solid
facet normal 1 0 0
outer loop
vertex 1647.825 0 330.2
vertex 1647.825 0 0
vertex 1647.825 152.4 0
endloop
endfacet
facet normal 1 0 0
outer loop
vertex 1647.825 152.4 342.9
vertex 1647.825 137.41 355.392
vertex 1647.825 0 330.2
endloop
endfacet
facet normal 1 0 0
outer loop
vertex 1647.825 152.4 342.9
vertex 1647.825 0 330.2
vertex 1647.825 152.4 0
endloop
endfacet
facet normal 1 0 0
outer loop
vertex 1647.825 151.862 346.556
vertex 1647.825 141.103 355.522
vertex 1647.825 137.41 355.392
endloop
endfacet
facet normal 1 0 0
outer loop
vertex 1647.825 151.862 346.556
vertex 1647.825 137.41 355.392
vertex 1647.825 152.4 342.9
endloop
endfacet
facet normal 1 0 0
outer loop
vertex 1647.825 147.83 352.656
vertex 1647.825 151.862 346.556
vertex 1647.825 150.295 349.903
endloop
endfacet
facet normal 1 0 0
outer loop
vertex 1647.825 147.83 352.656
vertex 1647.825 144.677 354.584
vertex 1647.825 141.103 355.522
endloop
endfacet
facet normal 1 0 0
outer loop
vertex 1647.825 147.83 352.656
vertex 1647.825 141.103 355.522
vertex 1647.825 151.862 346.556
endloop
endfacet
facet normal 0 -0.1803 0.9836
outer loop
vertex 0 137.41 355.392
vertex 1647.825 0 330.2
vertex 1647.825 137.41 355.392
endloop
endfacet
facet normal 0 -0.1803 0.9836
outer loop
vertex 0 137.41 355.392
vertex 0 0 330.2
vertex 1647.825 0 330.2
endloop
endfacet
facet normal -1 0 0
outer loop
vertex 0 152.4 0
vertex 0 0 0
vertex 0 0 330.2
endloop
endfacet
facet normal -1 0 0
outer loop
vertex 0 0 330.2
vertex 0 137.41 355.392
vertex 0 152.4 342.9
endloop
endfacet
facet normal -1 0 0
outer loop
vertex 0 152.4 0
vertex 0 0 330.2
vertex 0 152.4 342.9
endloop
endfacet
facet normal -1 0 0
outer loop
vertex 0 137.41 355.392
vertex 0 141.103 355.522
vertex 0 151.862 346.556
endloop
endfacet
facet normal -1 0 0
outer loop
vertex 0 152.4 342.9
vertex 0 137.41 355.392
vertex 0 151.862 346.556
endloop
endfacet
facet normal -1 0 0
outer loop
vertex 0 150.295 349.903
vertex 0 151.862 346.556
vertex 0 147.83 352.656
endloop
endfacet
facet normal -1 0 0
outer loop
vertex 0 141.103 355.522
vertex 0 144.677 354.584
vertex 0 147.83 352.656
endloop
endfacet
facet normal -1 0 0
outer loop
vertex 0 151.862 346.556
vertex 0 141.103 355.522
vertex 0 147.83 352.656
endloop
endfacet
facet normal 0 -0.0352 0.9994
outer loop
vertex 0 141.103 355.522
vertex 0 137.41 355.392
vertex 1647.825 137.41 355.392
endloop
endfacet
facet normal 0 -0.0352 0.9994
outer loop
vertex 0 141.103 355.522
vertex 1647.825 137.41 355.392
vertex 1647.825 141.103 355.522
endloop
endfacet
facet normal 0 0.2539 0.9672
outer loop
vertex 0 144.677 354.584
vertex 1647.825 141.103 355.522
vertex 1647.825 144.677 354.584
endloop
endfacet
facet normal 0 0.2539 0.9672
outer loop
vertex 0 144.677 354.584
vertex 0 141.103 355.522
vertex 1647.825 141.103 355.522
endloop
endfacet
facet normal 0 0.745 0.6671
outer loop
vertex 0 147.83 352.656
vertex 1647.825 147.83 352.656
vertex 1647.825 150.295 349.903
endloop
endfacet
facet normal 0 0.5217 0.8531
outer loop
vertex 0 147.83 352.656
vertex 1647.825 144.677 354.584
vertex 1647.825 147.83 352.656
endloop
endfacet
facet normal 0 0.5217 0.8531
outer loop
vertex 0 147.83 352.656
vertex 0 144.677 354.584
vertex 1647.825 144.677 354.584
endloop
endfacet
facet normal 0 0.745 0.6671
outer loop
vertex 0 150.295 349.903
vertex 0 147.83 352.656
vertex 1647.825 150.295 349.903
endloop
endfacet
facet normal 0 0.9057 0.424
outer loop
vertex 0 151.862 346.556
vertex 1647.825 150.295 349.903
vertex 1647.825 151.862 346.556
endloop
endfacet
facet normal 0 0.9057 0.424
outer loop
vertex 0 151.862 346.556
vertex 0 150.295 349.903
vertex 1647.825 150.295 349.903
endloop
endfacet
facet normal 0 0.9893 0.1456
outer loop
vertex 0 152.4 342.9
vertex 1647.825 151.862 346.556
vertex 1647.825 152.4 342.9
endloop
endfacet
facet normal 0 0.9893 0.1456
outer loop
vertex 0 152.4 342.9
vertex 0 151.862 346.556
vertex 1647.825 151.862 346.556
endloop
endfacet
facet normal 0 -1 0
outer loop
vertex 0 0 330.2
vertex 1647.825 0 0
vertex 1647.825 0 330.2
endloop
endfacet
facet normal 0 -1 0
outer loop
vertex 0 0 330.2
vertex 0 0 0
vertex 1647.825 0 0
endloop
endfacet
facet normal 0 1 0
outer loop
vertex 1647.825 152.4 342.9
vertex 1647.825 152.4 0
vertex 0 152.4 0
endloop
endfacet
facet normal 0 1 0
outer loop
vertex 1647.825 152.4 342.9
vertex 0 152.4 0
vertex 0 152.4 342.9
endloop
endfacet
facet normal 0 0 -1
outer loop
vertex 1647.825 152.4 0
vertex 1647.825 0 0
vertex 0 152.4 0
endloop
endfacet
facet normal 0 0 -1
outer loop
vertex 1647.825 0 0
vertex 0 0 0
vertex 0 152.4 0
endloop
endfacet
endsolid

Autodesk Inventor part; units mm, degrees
ref_plane "YZ Plane" through (0, 0, 0) normal (1, 0, 0) x (0, 1, 0)
ref_plane "XZ Plane" through (0, 0, 0) normal (0, 1, 0) x (-1, 0, 0)
ref_plane "XY Plane" through (0, 0, 0) normal (0, 0, 1) x (1, 0, 0)
sketch "Profile" plane through (0, 0, 0) normal (0, 0, 1) x (1, 0, 0)
  line L0 (0, 0) -> (0, 330.2)
  line L1 (0, 0) -> (152.4, 0)
  line L2 (152.4, 0) -> (152.4, 342.9)
  line L3 (152.4, 342.9) -> (139.7, 342.9) construction
  line L4 (152.4, 342.9) -> (139.7, 342.9) construction
  arc A0 (152.4, 342.9) -> (137.4098, 355.3918) centre (139.7, 342.9) ccw
  line L5 (0, 330.2) -> (137.4098, 355.3918)
  dimension "d0" = 330.2
  dimension "d1" = 152.4
  dimension "d2" = 342.9
  dimension "d3" = 12.7
  dimension "d4" = 12.7
sketch "Sketch1" plane through (0, 0, 0) normal (1, 0, 0) x (0, 1, 0)
  line L0 (0, 0) -> (0, 330.2)
  line L1 (0, 0) -> (152.4, 0)
  line L2 (152.4, 0) -> (152.4, 342.9)
  line L3 (152.4, 342.9) -> (139.7, 342.9) construction
  line L4 (152.4, 342.9) -> (139.7, 342.9) construction
  arc A0 (152.4, 342.9) -> (137.4098, 355.3918) centre (139.7, 342.9) ccw
  line L5 (0, 330.2) -> (137.4098, 355.3918)
extrude "Extrusion1" add sketch "Sketch1" along normal blind 1647.825
properties part number "D" material "Granite, Cut, Polished"
